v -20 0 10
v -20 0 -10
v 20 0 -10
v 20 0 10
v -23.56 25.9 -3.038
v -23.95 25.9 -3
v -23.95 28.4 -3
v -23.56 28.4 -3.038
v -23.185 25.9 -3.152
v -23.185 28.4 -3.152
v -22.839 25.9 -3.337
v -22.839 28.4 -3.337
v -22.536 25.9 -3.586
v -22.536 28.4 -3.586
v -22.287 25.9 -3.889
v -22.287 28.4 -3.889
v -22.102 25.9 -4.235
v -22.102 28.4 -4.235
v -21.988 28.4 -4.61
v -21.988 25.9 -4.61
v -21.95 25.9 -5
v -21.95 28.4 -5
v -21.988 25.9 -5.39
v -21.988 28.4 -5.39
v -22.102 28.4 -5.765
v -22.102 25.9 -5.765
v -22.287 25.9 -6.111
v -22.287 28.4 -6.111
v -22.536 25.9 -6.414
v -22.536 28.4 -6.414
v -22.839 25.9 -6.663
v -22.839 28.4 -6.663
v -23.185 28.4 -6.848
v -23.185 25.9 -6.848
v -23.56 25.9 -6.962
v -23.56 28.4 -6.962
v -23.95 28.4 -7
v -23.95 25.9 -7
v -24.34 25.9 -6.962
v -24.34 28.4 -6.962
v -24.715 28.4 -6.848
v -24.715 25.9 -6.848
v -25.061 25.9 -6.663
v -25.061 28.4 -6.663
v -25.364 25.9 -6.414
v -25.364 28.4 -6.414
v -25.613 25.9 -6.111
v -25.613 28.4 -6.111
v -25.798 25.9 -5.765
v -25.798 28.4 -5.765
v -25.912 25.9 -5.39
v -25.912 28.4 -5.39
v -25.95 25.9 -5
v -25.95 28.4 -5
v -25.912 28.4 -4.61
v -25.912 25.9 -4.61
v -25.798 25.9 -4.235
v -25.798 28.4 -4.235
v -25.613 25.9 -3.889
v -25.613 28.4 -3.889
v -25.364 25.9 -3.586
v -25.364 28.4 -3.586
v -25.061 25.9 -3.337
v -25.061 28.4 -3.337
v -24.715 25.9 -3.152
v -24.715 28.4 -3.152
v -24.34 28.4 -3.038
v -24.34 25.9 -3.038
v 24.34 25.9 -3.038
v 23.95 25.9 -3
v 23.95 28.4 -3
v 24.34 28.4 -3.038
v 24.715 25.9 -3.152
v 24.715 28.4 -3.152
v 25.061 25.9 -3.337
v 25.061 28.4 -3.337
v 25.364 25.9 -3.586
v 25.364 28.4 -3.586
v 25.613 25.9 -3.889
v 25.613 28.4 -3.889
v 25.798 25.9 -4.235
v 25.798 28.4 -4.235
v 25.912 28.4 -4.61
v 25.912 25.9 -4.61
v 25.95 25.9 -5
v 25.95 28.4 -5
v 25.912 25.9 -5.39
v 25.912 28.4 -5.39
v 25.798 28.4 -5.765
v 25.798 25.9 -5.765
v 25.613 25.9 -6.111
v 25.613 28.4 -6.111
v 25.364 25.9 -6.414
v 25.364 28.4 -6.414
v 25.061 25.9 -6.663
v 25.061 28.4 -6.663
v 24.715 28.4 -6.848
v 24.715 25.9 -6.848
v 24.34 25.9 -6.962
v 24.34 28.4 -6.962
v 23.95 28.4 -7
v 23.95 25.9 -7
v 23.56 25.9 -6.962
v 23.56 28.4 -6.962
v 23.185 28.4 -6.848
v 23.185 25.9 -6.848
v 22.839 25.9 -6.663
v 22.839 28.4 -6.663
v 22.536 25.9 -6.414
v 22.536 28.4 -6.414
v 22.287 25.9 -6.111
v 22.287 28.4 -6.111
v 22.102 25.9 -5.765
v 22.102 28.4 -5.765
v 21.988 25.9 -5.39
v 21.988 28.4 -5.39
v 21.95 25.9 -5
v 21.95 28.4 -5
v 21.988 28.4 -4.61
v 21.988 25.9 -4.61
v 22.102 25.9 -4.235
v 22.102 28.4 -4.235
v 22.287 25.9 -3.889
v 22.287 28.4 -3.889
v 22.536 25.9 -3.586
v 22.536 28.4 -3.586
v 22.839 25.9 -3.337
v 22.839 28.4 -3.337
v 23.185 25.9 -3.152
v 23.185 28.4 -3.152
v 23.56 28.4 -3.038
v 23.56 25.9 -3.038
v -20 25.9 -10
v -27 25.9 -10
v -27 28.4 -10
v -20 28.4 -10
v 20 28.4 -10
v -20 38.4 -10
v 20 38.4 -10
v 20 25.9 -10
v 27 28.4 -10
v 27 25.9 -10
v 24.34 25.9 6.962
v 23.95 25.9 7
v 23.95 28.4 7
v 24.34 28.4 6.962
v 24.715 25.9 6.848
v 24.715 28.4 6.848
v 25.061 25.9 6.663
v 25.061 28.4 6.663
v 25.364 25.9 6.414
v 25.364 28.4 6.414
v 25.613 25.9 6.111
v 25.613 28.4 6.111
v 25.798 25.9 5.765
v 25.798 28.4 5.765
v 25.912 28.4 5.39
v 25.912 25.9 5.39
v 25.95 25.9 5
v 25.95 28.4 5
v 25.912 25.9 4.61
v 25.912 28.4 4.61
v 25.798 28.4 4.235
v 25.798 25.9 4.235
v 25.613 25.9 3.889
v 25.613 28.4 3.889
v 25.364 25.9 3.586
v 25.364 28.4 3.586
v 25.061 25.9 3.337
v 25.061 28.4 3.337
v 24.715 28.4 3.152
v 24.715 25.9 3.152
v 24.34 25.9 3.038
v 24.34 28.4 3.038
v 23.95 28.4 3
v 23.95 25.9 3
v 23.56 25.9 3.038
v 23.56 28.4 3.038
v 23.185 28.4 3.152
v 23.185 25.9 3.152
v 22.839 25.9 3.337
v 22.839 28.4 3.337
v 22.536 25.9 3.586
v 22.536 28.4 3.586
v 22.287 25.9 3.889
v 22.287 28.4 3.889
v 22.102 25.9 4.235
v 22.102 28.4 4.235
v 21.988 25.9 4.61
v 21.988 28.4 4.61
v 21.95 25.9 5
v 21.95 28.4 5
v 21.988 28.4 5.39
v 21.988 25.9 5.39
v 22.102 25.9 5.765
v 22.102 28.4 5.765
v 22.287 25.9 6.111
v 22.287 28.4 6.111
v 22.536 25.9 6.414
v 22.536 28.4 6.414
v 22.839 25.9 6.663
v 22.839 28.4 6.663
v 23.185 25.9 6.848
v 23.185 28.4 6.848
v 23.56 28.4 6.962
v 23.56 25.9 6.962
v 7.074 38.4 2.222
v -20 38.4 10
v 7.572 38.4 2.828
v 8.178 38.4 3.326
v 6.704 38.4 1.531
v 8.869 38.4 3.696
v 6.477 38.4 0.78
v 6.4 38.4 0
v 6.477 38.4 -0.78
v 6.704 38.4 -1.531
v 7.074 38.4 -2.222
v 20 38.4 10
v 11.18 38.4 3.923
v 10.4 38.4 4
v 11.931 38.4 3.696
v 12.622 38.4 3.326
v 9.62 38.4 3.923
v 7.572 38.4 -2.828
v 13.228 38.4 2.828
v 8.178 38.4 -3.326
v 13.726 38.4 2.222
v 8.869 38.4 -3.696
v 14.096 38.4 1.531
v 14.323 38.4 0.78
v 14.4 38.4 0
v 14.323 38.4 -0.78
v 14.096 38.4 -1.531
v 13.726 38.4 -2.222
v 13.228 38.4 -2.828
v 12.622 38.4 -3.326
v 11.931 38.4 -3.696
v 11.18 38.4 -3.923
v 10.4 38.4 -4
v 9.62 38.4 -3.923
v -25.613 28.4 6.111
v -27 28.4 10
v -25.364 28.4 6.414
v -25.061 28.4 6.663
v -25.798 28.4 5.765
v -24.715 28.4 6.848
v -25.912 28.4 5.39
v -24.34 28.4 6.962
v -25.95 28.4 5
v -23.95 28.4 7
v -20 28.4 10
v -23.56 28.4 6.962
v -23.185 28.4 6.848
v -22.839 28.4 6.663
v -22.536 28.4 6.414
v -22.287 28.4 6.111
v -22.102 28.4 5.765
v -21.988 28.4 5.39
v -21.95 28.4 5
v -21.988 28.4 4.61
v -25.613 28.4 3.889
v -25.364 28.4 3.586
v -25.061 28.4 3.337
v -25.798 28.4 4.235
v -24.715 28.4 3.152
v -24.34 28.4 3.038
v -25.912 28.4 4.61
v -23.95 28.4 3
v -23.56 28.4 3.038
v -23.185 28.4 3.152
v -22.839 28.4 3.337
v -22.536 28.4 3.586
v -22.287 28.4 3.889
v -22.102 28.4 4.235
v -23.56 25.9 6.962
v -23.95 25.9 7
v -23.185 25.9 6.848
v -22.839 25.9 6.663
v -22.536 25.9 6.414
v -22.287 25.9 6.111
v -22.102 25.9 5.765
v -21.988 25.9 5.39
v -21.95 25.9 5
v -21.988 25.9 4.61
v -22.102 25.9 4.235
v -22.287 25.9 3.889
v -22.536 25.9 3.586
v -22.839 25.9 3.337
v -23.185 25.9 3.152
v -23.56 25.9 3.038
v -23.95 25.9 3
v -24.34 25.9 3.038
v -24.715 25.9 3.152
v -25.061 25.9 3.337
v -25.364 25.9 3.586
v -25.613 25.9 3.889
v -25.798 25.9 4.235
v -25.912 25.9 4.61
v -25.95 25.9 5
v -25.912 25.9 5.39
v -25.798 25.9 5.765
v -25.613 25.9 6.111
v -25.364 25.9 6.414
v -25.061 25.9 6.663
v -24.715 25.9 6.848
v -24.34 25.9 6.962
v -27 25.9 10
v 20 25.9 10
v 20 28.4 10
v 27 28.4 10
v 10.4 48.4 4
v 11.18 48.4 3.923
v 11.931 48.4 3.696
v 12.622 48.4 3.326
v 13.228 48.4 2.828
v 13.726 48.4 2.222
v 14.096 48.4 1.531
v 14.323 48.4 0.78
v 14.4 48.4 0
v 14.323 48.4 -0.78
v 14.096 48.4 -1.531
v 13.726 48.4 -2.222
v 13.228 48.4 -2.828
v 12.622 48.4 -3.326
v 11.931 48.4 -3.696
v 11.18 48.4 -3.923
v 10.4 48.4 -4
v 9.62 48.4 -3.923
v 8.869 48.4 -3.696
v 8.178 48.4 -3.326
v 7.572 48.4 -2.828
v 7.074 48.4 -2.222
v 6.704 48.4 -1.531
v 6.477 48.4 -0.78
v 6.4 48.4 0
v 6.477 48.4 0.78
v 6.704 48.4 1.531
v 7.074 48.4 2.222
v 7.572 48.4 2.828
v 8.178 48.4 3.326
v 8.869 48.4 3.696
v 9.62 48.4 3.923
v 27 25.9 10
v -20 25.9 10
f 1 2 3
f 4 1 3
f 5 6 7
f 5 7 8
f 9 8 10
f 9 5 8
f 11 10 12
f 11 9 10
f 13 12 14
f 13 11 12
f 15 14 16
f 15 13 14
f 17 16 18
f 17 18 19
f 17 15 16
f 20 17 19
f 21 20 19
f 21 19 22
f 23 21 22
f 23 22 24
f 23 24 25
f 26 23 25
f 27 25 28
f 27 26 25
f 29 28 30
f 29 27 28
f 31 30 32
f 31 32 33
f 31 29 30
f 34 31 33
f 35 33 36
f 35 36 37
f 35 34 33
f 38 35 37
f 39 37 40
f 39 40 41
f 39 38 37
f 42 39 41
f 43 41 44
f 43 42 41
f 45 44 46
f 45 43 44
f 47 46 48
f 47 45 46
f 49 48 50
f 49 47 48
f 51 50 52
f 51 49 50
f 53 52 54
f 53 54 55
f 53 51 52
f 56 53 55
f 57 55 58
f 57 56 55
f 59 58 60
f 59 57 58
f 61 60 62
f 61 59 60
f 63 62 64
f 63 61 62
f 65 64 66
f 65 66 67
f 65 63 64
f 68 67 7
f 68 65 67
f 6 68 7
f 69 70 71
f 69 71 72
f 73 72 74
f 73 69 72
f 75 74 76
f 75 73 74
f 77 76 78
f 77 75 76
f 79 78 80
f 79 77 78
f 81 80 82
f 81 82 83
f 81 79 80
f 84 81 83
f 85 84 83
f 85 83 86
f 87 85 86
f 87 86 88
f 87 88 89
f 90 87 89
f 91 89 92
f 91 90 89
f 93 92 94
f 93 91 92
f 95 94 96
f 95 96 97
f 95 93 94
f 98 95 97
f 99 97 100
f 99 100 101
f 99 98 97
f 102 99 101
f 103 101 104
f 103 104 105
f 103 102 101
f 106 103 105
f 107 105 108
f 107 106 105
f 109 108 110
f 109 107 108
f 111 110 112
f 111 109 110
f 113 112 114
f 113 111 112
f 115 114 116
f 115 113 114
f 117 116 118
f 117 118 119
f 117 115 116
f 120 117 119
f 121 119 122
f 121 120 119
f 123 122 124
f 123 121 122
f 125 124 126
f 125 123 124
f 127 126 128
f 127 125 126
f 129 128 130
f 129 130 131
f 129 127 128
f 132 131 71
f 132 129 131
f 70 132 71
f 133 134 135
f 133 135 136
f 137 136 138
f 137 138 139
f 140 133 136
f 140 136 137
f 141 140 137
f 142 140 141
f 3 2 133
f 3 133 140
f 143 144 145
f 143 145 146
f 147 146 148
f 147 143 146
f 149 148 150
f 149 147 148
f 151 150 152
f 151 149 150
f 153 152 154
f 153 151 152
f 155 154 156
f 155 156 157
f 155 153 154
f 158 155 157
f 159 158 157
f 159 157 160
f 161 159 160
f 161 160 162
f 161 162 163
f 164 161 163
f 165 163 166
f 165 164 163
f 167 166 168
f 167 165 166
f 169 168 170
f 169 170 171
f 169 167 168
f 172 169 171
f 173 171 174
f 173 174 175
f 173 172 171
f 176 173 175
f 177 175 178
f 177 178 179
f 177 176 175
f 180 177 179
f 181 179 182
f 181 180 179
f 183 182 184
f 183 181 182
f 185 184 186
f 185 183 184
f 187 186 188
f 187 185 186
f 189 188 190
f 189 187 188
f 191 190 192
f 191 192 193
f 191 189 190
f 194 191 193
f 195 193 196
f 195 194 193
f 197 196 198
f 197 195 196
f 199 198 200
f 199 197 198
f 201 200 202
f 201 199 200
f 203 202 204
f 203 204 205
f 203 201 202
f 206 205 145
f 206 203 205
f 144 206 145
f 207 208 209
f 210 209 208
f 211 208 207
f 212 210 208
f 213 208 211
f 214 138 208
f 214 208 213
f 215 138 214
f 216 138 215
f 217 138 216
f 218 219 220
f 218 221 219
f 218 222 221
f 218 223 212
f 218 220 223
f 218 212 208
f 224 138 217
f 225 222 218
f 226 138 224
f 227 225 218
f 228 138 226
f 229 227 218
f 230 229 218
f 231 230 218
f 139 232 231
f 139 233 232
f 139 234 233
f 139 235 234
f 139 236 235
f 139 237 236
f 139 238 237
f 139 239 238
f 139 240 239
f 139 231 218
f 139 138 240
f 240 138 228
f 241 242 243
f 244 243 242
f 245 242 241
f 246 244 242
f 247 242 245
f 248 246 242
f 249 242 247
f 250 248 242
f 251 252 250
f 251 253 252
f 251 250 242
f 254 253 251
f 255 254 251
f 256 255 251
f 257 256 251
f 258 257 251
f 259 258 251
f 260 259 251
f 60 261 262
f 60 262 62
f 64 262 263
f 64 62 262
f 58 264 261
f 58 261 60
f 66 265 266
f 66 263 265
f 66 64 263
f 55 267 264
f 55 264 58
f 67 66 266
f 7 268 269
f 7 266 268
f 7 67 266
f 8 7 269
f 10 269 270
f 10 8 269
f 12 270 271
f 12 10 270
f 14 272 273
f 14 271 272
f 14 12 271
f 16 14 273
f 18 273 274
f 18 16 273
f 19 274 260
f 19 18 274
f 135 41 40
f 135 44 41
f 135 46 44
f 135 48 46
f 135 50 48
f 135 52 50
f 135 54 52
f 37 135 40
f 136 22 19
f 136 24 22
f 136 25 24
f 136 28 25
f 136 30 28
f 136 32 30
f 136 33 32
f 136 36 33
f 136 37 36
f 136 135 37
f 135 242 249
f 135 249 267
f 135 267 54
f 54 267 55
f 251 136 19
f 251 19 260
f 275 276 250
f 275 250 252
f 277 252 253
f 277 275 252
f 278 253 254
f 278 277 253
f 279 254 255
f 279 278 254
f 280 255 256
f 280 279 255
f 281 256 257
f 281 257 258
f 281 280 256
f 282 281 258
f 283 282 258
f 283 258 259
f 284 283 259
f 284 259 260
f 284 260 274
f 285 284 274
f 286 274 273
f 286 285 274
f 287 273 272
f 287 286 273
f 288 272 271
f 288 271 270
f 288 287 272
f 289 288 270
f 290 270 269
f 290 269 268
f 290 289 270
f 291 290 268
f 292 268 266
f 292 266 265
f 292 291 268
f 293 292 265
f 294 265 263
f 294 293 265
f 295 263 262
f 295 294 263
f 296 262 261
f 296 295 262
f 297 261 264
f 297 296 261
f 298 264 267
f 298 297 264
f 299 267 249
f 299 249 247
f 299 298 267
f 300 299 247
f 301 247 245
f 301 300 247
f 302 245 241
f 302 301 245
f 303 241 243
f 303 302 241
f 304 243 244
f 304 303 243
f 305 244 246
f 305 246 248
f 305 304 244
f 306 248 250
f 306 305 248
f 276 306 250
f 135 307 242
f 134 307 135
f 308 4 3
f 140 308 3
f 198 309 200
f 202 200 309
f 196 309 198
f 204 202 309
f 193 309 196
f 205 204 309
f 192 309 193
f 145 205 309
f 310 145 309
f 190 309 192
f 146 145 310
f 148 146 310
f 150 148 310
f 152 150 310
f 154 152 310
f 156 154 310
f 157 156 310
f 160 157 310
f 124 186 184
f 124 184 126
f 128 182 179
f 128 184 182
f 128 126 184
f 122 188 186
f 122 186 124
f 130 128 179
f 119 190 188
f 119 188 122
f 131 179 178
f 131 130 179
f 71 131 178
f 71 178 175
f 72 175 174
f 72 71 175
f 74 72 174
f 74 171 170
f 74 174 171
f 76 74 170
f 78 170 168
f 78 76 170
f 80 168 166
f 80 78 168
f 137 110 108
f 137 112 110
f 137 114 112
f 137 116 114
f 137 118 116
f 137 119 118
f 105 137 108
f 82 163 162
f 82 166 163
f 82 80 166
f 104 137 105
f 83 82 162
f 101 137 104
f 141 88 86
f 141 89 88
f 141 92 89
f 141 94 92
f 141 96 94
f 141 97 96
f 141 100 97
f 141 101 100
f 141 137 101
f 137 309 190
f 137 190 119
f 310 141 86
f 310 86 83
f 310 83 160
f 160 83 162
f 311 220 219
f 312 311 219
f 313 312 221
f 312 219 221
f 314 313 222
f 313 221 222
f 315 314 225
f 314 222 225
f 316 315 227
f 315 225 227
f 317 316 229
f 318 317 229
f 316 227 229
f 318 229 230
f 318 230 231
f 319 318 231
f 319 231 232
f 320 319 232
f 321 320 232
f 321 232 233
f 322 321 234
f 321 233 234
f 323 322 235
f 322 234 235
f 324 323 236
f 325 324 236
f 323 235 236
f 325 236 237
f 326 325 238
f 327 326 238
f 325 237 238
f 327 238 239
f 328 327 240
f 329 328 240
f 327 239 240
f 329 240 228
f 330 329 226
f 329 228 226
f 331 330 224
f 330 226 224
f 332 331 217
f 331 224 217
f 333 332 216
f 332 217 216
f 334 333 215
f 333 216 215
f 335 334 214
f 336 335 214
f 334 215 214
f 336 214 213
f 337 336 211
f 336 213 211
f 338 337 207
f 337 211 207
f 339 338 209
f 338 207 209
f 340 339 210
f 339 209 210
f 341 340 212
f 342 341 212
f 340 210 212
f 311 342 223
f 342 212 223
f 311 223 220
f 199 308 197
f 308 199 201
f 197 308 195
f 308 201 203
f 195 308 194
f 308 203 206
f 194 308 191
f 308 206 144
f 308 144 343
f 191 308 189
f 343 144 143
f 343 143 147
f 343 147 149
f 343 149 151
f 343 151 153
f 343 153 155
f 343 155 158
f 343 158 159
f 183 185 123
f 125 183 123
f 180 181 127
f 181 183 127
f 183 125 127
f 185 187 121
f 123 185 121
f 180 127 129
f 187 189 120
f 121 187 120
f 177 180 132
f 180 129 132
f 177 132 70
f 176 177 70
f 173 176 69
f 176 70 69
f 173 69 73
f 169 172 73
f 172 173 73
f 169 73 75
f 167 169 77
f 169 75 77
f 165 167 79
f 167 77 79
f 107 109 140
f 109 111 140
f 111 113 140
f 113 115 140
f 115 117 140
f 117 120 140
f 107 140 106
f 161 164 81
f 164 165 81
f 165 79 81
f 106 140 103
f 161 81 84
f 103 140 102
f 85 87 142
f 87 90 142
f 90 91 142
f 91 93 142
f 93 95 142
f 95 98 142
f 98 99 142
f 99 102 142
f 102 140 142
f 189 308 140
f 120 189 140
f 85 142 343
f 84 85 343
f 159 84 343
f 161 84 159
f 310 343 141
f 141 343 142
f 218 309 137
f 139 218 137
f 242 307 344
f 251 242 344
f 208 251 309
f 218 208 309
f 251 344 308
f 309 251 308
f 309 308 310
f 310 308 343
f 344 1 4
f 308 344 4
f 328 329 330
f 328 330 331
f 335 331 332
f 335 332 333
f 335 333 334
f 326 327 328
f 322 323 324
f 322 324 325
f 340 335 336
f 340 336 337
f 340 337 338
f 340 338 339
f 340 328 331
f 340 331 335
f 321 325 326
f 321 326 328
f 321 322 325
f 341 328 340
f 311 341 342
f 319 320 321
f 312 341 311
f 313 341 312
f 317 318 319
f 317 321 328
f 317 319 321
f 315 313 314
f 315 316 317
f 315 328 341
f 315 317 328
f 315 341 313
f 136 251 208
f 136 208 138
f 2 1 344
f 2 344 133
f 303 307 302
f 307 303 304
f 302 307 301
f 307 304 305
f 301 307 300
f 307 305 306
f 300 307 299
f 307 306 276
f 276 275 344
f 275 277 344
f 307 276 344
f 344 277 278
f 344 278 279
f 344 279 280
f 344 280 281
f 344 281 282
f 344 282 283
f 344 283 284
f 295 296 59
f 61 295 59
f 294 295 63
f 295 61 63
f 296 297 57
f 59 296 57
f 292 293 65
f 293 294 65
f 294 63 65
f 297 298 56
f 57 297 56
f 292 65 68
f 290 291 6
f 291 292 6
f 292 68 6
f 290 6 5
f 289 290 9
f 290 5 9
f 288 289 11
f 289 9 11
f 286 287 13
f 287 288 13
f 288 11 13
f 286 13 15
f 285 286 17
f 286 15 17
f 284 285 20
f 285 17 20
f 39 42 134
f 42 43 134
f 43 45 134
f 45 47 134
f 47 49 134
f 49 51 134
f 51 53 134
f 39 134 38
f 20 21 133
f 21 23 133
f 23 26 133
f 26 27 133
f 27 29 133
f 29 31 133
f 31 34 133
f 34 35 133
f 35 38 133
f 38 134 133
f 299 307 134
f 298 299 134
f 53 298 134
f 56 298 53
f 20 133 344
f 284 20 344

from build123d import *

# Parameters (mm, degrees)
SKETCH1_W           = 40
SKETCH1_H           = 20
BOSS_EXTRUDE1_DEPTH = 25.9
SKETCH2_W           = 54
SKETCH2_H           = 20
SKETCH2_R           = 2
BOSS_EXTRUDE2_DEPTH = 2.5
SKETCH3_W           = 40
SKETCH3_H           = 20
BOSS_EXTRUDE3_DEPTH = 10
SKETCH4_R           = 4
BOSS_EXTRUDE4_DEPTH = 10


with BuildPart() as part:
    # Sketch1 → Boss-Extrude1 (new body)
    with BuildSketch(Plane(origin=(0, 0, 0), x_dir=(1, 0, 0), z_dir=(0, 1, 0))):
        Rectangle(SKETCH1_W, SKETCH1_H)
    extrude(amount=BOSS_EXTRUDE1_DEPTH)

    # Sketch2 → Boss-Extrude2 (add)
    with BuildSketch(Plane(origin=(0, 25.9, 0), x_dir=(1, 0, 0), z_dir=(0, 1, 0))):
        Rectangle(SKETCH2_W, SKETCH2_H)
        with Locations(Location((-23.95, 5, 0), (0, 0, 270))):
            Circle(SKETCH2_R, mode=Mode.SUBTRACT)
        with Locations(Location((-23.95, -5, 0), (0, 0, 270))):
            Circle(SKETCH2_R, mode=Mode.SUBTRACT)
        with Locations(Location((23.95, 5, 0), (0, 0, 270))):
            Circle(SKETCH2_R, mode=Mode.SUBTRACT)
        with Locations(Location((23.95, -5, 0), (0, 0, 270))):
            Circle(SKETCH2_R, mode=Mode.SUBTRACT)
    extrude(amount=BOSS_EXTRUDE2_DEPTH)

    # Sketch3 → Boss-Extrude3 (add)
    with BuildSketch(Plane(origin=(0, 28.4, 0), x_dir=(1, 0, 0), z_dir=(0, 1, 0))):
        Rectangle(SKETCH3_W, SKETCH3_H)
    extrude(amount=BOSS_EXTRUDE3_DEPTH)

    # Sketch4 → Boss-Extrude4 (add)
    with BuildSketch(Plane(origin=(0, 38.4, 0), x_dir=(1, 0, 0), z_dir=(0, 1, 0))):
        with Locations(Location((10.4, 0, 0), (0, 0, 270))):
            Circle(SKETCH4_R)
    extrude(amount=BOSS_EXTRUDE4_DEPTH)


solid = part.part
